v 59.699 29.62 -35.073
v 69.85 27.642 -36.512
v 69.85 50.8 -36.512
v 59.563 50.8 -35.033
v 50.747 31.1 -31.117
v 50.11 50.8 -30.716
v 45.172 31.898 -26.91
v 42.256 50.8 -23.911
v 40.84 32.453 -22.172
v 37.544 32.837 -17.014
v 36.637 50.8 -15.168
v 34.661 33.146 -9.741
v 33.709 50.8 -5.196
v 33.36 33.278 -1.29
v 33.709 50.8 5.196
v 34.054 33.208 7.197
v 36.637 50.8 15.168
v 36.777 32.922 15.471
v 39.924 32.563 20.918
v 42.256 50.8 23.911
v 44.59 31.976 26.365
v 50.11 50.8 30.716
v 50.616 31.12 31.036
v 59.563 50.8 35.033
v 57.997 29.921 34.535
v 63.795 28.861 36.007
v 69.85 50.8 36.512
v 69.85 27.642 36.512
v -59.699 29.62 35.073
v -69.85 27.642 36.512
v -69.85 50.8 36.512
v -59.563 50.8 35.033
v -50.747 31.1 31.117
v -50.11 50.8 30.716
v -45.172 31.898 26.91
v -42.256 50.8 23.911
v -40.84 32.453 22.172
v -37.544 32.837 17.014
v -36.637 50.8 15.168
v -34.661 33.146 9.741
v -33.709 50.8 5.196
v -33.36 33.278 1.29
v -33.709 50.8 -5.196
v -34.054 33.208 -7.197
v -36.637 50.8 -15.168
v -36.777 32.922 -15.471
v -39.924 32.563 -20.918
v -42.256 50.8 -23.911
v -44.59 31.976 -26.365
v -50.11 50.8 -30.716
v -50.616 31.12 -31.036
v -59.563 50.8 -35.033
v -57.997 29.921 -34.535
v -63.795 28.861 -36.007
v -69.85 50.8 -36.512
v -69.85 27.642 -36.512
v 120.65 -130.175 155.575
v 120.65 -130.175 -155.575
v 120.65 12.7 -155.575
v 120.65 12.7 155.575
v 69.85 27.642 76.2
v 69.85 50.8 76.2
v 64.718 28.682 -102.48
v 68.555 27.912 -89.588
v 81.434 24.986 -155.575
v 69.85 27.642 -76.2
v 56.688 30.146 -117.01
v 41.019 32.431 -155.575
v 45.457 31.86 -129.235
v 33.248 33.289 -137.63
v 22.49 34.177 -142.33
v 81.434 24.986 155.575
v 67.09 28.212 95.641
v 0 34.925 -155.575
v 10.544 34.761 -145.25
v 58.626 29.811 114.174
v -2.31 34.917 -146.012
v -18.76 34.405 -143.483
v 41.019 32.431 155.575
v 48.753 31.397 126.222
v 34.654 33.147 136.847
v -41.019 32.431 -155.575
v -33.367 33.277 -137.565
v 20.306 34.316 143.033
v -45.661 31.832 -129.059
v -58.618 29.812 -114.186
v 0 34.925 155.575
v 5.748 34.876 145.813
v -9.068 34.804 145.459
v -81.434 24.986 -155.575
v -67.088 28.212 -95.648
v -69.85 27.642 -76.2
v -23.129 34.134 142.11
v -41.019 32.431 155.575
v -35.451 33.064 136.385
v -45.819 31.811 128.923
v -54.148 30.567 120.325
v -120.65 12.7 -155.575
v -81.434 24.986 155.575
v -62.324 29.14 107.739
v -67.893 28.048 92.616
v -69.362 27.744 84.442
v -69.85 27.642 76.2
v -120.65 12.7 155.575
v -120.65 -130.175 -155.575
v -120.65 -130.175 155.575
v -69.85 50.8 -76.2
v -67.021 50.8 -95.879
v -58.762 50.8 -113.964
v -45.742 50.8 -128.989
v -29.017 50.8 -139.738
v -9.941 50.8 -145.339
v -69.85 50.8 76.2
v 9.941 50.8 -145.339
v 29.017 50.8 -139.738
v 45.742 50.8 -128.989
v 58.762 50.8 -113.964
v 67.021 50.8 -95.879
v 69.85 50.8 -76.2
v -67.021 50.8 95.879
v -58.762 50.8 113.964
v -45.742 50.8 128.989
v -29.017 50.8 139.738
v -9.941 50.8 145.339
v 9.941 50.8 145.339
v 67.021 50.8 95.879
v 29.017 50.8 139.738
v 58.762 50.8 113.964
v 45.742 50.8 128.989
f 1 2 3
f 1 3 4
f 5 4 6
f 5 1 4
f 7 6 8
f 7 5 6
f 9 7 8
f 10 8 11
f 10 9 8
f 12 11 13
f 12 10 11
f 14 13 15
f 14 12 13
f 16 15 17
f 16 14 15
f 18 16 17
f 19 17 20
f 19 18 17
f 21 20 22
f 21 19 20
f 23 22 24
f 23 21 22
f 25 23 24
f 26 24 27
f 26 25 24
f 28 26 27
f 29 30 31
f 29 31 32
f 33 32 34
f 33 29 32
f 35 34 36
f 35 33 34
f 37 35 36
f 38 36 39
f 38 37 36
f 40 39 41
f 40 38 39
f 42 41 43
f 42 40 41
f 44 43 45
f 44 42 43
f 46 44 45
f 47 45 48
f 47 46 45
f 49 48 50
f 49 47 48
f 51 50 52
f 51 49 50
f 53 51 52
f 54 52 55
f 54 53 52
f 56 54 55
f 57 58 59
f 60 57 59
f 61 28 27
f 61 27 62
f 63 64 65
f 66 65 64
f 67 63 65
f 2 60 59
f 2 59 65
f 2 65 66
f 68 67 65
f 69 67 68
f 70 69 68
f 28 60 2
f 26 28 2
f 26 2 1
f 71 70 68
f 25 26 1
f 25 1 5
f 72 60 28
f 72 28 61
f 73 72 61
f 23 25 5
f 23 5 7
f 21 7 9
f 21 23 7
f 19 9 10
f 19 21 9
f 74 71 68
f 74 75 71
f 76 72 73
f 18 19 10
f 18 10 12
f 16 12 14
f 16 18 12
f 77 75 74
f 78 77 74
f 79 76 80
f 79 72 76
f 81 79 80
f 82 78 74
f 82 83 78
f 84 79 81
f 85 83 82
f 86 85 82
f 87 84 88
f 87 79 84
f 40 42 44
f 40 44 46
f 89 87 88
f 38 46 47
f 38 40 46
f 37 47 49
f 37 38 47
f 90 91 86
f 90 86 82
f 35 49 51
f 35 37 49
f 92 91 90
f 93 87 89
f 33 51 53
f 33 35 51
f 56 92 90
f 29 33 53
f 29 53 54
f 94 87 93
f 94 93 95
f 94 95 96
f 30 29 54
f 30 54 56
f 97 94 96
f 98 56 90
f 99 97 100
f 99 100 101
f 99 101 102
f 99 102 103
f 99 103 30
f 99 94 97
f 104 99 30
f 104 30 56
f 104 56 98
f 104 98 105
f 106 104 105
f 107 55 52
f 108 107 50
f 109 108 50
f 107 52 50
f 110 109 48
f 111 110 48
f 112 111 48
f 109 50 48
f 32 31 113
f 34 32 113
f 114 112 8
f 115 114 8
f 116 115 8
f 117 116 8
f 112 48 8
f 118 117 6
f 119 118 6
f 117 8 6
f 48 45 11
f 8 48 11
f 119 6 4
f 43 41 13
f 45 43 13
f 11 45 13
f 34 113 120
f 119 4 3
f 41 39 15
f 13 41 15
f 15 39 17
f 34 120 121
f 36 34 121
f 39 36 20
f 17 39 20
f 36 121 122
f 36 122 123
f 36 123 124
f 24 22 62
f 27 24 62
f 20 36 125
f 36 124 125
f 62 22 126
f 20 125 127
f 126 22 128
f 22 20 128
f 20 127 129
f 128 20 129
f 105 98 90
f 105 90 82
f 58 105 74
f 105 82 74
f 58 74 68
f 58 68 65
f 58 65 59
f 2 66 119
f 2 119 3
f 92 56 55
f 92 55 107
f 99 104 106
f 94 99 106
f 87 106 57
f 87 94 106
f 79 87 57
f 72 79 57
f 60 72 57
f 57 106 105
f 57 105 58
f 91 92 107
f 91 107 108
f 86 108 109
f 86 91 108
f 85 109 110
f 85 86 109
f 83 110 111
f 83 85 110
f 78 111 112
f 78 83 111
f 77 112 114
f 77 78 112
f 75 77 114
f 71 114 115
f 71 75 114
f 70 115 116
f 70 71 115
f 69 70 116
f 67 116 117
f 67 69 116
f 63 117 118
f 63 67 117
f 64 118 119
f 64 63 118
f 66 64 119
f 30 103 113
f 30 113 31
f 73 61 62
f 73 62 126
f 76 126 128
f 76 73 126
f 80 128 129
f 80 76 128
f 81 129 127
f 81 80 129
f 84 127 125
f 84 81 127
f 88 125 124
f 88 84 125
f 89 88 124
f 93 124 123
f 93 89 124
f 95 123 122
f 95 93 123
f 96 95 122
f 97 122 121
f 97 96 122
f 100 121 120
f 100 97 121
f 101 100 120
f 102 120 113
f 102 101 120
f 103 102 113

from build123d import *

# Parameters (mm, degrees)
F0_W     = 241.3
F0_H     = 311.15
F1_DEPTH = 130.175
F3_DEPTH = 311.15
F5_DEPTH = 50.8


# Not quite as in the source:
# - a length typed as a fraction of an inch, garbled in the dataset ("3 / 203.2 mm" for 3/8 in), is restored


with BuildPart() as f1:
    # F0 (on Front) → F1 (new body)
    with BuildSketch(Plane.XZ):
        Rectangle(F0_W, F0_H)
    extrude(amount=F1_DEPTH)

    # F2 (on face) → F3 (join, through all)
    with BuildSketch(Plane.XY.offset(155.575)):
        with BuildLine():
            Line((-120.65, 12.7), (-120.65, 0))
            Line((-120.65, 0), (120.65, 0))
            Line((120.65, 0), (120.65, 12.7))
            ThreePointArc((120.65, 12.7), (0, 34.925), (-120.65, 12.7))
        make_face()
    extrude(amount=-F3_DEPTH)

    # F4 (on Front) → F5 (join)
    with BuildSketch(Plane.XZ):
        with BuildLine():
            Line((69.85, 36.5125), (69.85, 76.2))
            ThreePointArc((69.85, 76.2), (0, 146.05), (-69.85, 76.2))
            Line((-69.85, 76.2), (-69.85, 36.5125))
            ThreePointArc((-69.85, 36.5125), (-33.3375, 0), (-69.85, -36.5125))
            Line((-69.85, -36.5125), (-69.85, -76.2))
            ThreePointArc((-69.85, -76.2), (0, -146.05), (69.85, -76.2))
            Line((69.85, -76.2), (69.85, -36.5125))
            ThreePointArc((69.85, -36.5125), (33.3375, 0), (69.85, 36.5125))
        make_face()
    extrude(amount=-F5_DEPTH)


solid = f1.part
